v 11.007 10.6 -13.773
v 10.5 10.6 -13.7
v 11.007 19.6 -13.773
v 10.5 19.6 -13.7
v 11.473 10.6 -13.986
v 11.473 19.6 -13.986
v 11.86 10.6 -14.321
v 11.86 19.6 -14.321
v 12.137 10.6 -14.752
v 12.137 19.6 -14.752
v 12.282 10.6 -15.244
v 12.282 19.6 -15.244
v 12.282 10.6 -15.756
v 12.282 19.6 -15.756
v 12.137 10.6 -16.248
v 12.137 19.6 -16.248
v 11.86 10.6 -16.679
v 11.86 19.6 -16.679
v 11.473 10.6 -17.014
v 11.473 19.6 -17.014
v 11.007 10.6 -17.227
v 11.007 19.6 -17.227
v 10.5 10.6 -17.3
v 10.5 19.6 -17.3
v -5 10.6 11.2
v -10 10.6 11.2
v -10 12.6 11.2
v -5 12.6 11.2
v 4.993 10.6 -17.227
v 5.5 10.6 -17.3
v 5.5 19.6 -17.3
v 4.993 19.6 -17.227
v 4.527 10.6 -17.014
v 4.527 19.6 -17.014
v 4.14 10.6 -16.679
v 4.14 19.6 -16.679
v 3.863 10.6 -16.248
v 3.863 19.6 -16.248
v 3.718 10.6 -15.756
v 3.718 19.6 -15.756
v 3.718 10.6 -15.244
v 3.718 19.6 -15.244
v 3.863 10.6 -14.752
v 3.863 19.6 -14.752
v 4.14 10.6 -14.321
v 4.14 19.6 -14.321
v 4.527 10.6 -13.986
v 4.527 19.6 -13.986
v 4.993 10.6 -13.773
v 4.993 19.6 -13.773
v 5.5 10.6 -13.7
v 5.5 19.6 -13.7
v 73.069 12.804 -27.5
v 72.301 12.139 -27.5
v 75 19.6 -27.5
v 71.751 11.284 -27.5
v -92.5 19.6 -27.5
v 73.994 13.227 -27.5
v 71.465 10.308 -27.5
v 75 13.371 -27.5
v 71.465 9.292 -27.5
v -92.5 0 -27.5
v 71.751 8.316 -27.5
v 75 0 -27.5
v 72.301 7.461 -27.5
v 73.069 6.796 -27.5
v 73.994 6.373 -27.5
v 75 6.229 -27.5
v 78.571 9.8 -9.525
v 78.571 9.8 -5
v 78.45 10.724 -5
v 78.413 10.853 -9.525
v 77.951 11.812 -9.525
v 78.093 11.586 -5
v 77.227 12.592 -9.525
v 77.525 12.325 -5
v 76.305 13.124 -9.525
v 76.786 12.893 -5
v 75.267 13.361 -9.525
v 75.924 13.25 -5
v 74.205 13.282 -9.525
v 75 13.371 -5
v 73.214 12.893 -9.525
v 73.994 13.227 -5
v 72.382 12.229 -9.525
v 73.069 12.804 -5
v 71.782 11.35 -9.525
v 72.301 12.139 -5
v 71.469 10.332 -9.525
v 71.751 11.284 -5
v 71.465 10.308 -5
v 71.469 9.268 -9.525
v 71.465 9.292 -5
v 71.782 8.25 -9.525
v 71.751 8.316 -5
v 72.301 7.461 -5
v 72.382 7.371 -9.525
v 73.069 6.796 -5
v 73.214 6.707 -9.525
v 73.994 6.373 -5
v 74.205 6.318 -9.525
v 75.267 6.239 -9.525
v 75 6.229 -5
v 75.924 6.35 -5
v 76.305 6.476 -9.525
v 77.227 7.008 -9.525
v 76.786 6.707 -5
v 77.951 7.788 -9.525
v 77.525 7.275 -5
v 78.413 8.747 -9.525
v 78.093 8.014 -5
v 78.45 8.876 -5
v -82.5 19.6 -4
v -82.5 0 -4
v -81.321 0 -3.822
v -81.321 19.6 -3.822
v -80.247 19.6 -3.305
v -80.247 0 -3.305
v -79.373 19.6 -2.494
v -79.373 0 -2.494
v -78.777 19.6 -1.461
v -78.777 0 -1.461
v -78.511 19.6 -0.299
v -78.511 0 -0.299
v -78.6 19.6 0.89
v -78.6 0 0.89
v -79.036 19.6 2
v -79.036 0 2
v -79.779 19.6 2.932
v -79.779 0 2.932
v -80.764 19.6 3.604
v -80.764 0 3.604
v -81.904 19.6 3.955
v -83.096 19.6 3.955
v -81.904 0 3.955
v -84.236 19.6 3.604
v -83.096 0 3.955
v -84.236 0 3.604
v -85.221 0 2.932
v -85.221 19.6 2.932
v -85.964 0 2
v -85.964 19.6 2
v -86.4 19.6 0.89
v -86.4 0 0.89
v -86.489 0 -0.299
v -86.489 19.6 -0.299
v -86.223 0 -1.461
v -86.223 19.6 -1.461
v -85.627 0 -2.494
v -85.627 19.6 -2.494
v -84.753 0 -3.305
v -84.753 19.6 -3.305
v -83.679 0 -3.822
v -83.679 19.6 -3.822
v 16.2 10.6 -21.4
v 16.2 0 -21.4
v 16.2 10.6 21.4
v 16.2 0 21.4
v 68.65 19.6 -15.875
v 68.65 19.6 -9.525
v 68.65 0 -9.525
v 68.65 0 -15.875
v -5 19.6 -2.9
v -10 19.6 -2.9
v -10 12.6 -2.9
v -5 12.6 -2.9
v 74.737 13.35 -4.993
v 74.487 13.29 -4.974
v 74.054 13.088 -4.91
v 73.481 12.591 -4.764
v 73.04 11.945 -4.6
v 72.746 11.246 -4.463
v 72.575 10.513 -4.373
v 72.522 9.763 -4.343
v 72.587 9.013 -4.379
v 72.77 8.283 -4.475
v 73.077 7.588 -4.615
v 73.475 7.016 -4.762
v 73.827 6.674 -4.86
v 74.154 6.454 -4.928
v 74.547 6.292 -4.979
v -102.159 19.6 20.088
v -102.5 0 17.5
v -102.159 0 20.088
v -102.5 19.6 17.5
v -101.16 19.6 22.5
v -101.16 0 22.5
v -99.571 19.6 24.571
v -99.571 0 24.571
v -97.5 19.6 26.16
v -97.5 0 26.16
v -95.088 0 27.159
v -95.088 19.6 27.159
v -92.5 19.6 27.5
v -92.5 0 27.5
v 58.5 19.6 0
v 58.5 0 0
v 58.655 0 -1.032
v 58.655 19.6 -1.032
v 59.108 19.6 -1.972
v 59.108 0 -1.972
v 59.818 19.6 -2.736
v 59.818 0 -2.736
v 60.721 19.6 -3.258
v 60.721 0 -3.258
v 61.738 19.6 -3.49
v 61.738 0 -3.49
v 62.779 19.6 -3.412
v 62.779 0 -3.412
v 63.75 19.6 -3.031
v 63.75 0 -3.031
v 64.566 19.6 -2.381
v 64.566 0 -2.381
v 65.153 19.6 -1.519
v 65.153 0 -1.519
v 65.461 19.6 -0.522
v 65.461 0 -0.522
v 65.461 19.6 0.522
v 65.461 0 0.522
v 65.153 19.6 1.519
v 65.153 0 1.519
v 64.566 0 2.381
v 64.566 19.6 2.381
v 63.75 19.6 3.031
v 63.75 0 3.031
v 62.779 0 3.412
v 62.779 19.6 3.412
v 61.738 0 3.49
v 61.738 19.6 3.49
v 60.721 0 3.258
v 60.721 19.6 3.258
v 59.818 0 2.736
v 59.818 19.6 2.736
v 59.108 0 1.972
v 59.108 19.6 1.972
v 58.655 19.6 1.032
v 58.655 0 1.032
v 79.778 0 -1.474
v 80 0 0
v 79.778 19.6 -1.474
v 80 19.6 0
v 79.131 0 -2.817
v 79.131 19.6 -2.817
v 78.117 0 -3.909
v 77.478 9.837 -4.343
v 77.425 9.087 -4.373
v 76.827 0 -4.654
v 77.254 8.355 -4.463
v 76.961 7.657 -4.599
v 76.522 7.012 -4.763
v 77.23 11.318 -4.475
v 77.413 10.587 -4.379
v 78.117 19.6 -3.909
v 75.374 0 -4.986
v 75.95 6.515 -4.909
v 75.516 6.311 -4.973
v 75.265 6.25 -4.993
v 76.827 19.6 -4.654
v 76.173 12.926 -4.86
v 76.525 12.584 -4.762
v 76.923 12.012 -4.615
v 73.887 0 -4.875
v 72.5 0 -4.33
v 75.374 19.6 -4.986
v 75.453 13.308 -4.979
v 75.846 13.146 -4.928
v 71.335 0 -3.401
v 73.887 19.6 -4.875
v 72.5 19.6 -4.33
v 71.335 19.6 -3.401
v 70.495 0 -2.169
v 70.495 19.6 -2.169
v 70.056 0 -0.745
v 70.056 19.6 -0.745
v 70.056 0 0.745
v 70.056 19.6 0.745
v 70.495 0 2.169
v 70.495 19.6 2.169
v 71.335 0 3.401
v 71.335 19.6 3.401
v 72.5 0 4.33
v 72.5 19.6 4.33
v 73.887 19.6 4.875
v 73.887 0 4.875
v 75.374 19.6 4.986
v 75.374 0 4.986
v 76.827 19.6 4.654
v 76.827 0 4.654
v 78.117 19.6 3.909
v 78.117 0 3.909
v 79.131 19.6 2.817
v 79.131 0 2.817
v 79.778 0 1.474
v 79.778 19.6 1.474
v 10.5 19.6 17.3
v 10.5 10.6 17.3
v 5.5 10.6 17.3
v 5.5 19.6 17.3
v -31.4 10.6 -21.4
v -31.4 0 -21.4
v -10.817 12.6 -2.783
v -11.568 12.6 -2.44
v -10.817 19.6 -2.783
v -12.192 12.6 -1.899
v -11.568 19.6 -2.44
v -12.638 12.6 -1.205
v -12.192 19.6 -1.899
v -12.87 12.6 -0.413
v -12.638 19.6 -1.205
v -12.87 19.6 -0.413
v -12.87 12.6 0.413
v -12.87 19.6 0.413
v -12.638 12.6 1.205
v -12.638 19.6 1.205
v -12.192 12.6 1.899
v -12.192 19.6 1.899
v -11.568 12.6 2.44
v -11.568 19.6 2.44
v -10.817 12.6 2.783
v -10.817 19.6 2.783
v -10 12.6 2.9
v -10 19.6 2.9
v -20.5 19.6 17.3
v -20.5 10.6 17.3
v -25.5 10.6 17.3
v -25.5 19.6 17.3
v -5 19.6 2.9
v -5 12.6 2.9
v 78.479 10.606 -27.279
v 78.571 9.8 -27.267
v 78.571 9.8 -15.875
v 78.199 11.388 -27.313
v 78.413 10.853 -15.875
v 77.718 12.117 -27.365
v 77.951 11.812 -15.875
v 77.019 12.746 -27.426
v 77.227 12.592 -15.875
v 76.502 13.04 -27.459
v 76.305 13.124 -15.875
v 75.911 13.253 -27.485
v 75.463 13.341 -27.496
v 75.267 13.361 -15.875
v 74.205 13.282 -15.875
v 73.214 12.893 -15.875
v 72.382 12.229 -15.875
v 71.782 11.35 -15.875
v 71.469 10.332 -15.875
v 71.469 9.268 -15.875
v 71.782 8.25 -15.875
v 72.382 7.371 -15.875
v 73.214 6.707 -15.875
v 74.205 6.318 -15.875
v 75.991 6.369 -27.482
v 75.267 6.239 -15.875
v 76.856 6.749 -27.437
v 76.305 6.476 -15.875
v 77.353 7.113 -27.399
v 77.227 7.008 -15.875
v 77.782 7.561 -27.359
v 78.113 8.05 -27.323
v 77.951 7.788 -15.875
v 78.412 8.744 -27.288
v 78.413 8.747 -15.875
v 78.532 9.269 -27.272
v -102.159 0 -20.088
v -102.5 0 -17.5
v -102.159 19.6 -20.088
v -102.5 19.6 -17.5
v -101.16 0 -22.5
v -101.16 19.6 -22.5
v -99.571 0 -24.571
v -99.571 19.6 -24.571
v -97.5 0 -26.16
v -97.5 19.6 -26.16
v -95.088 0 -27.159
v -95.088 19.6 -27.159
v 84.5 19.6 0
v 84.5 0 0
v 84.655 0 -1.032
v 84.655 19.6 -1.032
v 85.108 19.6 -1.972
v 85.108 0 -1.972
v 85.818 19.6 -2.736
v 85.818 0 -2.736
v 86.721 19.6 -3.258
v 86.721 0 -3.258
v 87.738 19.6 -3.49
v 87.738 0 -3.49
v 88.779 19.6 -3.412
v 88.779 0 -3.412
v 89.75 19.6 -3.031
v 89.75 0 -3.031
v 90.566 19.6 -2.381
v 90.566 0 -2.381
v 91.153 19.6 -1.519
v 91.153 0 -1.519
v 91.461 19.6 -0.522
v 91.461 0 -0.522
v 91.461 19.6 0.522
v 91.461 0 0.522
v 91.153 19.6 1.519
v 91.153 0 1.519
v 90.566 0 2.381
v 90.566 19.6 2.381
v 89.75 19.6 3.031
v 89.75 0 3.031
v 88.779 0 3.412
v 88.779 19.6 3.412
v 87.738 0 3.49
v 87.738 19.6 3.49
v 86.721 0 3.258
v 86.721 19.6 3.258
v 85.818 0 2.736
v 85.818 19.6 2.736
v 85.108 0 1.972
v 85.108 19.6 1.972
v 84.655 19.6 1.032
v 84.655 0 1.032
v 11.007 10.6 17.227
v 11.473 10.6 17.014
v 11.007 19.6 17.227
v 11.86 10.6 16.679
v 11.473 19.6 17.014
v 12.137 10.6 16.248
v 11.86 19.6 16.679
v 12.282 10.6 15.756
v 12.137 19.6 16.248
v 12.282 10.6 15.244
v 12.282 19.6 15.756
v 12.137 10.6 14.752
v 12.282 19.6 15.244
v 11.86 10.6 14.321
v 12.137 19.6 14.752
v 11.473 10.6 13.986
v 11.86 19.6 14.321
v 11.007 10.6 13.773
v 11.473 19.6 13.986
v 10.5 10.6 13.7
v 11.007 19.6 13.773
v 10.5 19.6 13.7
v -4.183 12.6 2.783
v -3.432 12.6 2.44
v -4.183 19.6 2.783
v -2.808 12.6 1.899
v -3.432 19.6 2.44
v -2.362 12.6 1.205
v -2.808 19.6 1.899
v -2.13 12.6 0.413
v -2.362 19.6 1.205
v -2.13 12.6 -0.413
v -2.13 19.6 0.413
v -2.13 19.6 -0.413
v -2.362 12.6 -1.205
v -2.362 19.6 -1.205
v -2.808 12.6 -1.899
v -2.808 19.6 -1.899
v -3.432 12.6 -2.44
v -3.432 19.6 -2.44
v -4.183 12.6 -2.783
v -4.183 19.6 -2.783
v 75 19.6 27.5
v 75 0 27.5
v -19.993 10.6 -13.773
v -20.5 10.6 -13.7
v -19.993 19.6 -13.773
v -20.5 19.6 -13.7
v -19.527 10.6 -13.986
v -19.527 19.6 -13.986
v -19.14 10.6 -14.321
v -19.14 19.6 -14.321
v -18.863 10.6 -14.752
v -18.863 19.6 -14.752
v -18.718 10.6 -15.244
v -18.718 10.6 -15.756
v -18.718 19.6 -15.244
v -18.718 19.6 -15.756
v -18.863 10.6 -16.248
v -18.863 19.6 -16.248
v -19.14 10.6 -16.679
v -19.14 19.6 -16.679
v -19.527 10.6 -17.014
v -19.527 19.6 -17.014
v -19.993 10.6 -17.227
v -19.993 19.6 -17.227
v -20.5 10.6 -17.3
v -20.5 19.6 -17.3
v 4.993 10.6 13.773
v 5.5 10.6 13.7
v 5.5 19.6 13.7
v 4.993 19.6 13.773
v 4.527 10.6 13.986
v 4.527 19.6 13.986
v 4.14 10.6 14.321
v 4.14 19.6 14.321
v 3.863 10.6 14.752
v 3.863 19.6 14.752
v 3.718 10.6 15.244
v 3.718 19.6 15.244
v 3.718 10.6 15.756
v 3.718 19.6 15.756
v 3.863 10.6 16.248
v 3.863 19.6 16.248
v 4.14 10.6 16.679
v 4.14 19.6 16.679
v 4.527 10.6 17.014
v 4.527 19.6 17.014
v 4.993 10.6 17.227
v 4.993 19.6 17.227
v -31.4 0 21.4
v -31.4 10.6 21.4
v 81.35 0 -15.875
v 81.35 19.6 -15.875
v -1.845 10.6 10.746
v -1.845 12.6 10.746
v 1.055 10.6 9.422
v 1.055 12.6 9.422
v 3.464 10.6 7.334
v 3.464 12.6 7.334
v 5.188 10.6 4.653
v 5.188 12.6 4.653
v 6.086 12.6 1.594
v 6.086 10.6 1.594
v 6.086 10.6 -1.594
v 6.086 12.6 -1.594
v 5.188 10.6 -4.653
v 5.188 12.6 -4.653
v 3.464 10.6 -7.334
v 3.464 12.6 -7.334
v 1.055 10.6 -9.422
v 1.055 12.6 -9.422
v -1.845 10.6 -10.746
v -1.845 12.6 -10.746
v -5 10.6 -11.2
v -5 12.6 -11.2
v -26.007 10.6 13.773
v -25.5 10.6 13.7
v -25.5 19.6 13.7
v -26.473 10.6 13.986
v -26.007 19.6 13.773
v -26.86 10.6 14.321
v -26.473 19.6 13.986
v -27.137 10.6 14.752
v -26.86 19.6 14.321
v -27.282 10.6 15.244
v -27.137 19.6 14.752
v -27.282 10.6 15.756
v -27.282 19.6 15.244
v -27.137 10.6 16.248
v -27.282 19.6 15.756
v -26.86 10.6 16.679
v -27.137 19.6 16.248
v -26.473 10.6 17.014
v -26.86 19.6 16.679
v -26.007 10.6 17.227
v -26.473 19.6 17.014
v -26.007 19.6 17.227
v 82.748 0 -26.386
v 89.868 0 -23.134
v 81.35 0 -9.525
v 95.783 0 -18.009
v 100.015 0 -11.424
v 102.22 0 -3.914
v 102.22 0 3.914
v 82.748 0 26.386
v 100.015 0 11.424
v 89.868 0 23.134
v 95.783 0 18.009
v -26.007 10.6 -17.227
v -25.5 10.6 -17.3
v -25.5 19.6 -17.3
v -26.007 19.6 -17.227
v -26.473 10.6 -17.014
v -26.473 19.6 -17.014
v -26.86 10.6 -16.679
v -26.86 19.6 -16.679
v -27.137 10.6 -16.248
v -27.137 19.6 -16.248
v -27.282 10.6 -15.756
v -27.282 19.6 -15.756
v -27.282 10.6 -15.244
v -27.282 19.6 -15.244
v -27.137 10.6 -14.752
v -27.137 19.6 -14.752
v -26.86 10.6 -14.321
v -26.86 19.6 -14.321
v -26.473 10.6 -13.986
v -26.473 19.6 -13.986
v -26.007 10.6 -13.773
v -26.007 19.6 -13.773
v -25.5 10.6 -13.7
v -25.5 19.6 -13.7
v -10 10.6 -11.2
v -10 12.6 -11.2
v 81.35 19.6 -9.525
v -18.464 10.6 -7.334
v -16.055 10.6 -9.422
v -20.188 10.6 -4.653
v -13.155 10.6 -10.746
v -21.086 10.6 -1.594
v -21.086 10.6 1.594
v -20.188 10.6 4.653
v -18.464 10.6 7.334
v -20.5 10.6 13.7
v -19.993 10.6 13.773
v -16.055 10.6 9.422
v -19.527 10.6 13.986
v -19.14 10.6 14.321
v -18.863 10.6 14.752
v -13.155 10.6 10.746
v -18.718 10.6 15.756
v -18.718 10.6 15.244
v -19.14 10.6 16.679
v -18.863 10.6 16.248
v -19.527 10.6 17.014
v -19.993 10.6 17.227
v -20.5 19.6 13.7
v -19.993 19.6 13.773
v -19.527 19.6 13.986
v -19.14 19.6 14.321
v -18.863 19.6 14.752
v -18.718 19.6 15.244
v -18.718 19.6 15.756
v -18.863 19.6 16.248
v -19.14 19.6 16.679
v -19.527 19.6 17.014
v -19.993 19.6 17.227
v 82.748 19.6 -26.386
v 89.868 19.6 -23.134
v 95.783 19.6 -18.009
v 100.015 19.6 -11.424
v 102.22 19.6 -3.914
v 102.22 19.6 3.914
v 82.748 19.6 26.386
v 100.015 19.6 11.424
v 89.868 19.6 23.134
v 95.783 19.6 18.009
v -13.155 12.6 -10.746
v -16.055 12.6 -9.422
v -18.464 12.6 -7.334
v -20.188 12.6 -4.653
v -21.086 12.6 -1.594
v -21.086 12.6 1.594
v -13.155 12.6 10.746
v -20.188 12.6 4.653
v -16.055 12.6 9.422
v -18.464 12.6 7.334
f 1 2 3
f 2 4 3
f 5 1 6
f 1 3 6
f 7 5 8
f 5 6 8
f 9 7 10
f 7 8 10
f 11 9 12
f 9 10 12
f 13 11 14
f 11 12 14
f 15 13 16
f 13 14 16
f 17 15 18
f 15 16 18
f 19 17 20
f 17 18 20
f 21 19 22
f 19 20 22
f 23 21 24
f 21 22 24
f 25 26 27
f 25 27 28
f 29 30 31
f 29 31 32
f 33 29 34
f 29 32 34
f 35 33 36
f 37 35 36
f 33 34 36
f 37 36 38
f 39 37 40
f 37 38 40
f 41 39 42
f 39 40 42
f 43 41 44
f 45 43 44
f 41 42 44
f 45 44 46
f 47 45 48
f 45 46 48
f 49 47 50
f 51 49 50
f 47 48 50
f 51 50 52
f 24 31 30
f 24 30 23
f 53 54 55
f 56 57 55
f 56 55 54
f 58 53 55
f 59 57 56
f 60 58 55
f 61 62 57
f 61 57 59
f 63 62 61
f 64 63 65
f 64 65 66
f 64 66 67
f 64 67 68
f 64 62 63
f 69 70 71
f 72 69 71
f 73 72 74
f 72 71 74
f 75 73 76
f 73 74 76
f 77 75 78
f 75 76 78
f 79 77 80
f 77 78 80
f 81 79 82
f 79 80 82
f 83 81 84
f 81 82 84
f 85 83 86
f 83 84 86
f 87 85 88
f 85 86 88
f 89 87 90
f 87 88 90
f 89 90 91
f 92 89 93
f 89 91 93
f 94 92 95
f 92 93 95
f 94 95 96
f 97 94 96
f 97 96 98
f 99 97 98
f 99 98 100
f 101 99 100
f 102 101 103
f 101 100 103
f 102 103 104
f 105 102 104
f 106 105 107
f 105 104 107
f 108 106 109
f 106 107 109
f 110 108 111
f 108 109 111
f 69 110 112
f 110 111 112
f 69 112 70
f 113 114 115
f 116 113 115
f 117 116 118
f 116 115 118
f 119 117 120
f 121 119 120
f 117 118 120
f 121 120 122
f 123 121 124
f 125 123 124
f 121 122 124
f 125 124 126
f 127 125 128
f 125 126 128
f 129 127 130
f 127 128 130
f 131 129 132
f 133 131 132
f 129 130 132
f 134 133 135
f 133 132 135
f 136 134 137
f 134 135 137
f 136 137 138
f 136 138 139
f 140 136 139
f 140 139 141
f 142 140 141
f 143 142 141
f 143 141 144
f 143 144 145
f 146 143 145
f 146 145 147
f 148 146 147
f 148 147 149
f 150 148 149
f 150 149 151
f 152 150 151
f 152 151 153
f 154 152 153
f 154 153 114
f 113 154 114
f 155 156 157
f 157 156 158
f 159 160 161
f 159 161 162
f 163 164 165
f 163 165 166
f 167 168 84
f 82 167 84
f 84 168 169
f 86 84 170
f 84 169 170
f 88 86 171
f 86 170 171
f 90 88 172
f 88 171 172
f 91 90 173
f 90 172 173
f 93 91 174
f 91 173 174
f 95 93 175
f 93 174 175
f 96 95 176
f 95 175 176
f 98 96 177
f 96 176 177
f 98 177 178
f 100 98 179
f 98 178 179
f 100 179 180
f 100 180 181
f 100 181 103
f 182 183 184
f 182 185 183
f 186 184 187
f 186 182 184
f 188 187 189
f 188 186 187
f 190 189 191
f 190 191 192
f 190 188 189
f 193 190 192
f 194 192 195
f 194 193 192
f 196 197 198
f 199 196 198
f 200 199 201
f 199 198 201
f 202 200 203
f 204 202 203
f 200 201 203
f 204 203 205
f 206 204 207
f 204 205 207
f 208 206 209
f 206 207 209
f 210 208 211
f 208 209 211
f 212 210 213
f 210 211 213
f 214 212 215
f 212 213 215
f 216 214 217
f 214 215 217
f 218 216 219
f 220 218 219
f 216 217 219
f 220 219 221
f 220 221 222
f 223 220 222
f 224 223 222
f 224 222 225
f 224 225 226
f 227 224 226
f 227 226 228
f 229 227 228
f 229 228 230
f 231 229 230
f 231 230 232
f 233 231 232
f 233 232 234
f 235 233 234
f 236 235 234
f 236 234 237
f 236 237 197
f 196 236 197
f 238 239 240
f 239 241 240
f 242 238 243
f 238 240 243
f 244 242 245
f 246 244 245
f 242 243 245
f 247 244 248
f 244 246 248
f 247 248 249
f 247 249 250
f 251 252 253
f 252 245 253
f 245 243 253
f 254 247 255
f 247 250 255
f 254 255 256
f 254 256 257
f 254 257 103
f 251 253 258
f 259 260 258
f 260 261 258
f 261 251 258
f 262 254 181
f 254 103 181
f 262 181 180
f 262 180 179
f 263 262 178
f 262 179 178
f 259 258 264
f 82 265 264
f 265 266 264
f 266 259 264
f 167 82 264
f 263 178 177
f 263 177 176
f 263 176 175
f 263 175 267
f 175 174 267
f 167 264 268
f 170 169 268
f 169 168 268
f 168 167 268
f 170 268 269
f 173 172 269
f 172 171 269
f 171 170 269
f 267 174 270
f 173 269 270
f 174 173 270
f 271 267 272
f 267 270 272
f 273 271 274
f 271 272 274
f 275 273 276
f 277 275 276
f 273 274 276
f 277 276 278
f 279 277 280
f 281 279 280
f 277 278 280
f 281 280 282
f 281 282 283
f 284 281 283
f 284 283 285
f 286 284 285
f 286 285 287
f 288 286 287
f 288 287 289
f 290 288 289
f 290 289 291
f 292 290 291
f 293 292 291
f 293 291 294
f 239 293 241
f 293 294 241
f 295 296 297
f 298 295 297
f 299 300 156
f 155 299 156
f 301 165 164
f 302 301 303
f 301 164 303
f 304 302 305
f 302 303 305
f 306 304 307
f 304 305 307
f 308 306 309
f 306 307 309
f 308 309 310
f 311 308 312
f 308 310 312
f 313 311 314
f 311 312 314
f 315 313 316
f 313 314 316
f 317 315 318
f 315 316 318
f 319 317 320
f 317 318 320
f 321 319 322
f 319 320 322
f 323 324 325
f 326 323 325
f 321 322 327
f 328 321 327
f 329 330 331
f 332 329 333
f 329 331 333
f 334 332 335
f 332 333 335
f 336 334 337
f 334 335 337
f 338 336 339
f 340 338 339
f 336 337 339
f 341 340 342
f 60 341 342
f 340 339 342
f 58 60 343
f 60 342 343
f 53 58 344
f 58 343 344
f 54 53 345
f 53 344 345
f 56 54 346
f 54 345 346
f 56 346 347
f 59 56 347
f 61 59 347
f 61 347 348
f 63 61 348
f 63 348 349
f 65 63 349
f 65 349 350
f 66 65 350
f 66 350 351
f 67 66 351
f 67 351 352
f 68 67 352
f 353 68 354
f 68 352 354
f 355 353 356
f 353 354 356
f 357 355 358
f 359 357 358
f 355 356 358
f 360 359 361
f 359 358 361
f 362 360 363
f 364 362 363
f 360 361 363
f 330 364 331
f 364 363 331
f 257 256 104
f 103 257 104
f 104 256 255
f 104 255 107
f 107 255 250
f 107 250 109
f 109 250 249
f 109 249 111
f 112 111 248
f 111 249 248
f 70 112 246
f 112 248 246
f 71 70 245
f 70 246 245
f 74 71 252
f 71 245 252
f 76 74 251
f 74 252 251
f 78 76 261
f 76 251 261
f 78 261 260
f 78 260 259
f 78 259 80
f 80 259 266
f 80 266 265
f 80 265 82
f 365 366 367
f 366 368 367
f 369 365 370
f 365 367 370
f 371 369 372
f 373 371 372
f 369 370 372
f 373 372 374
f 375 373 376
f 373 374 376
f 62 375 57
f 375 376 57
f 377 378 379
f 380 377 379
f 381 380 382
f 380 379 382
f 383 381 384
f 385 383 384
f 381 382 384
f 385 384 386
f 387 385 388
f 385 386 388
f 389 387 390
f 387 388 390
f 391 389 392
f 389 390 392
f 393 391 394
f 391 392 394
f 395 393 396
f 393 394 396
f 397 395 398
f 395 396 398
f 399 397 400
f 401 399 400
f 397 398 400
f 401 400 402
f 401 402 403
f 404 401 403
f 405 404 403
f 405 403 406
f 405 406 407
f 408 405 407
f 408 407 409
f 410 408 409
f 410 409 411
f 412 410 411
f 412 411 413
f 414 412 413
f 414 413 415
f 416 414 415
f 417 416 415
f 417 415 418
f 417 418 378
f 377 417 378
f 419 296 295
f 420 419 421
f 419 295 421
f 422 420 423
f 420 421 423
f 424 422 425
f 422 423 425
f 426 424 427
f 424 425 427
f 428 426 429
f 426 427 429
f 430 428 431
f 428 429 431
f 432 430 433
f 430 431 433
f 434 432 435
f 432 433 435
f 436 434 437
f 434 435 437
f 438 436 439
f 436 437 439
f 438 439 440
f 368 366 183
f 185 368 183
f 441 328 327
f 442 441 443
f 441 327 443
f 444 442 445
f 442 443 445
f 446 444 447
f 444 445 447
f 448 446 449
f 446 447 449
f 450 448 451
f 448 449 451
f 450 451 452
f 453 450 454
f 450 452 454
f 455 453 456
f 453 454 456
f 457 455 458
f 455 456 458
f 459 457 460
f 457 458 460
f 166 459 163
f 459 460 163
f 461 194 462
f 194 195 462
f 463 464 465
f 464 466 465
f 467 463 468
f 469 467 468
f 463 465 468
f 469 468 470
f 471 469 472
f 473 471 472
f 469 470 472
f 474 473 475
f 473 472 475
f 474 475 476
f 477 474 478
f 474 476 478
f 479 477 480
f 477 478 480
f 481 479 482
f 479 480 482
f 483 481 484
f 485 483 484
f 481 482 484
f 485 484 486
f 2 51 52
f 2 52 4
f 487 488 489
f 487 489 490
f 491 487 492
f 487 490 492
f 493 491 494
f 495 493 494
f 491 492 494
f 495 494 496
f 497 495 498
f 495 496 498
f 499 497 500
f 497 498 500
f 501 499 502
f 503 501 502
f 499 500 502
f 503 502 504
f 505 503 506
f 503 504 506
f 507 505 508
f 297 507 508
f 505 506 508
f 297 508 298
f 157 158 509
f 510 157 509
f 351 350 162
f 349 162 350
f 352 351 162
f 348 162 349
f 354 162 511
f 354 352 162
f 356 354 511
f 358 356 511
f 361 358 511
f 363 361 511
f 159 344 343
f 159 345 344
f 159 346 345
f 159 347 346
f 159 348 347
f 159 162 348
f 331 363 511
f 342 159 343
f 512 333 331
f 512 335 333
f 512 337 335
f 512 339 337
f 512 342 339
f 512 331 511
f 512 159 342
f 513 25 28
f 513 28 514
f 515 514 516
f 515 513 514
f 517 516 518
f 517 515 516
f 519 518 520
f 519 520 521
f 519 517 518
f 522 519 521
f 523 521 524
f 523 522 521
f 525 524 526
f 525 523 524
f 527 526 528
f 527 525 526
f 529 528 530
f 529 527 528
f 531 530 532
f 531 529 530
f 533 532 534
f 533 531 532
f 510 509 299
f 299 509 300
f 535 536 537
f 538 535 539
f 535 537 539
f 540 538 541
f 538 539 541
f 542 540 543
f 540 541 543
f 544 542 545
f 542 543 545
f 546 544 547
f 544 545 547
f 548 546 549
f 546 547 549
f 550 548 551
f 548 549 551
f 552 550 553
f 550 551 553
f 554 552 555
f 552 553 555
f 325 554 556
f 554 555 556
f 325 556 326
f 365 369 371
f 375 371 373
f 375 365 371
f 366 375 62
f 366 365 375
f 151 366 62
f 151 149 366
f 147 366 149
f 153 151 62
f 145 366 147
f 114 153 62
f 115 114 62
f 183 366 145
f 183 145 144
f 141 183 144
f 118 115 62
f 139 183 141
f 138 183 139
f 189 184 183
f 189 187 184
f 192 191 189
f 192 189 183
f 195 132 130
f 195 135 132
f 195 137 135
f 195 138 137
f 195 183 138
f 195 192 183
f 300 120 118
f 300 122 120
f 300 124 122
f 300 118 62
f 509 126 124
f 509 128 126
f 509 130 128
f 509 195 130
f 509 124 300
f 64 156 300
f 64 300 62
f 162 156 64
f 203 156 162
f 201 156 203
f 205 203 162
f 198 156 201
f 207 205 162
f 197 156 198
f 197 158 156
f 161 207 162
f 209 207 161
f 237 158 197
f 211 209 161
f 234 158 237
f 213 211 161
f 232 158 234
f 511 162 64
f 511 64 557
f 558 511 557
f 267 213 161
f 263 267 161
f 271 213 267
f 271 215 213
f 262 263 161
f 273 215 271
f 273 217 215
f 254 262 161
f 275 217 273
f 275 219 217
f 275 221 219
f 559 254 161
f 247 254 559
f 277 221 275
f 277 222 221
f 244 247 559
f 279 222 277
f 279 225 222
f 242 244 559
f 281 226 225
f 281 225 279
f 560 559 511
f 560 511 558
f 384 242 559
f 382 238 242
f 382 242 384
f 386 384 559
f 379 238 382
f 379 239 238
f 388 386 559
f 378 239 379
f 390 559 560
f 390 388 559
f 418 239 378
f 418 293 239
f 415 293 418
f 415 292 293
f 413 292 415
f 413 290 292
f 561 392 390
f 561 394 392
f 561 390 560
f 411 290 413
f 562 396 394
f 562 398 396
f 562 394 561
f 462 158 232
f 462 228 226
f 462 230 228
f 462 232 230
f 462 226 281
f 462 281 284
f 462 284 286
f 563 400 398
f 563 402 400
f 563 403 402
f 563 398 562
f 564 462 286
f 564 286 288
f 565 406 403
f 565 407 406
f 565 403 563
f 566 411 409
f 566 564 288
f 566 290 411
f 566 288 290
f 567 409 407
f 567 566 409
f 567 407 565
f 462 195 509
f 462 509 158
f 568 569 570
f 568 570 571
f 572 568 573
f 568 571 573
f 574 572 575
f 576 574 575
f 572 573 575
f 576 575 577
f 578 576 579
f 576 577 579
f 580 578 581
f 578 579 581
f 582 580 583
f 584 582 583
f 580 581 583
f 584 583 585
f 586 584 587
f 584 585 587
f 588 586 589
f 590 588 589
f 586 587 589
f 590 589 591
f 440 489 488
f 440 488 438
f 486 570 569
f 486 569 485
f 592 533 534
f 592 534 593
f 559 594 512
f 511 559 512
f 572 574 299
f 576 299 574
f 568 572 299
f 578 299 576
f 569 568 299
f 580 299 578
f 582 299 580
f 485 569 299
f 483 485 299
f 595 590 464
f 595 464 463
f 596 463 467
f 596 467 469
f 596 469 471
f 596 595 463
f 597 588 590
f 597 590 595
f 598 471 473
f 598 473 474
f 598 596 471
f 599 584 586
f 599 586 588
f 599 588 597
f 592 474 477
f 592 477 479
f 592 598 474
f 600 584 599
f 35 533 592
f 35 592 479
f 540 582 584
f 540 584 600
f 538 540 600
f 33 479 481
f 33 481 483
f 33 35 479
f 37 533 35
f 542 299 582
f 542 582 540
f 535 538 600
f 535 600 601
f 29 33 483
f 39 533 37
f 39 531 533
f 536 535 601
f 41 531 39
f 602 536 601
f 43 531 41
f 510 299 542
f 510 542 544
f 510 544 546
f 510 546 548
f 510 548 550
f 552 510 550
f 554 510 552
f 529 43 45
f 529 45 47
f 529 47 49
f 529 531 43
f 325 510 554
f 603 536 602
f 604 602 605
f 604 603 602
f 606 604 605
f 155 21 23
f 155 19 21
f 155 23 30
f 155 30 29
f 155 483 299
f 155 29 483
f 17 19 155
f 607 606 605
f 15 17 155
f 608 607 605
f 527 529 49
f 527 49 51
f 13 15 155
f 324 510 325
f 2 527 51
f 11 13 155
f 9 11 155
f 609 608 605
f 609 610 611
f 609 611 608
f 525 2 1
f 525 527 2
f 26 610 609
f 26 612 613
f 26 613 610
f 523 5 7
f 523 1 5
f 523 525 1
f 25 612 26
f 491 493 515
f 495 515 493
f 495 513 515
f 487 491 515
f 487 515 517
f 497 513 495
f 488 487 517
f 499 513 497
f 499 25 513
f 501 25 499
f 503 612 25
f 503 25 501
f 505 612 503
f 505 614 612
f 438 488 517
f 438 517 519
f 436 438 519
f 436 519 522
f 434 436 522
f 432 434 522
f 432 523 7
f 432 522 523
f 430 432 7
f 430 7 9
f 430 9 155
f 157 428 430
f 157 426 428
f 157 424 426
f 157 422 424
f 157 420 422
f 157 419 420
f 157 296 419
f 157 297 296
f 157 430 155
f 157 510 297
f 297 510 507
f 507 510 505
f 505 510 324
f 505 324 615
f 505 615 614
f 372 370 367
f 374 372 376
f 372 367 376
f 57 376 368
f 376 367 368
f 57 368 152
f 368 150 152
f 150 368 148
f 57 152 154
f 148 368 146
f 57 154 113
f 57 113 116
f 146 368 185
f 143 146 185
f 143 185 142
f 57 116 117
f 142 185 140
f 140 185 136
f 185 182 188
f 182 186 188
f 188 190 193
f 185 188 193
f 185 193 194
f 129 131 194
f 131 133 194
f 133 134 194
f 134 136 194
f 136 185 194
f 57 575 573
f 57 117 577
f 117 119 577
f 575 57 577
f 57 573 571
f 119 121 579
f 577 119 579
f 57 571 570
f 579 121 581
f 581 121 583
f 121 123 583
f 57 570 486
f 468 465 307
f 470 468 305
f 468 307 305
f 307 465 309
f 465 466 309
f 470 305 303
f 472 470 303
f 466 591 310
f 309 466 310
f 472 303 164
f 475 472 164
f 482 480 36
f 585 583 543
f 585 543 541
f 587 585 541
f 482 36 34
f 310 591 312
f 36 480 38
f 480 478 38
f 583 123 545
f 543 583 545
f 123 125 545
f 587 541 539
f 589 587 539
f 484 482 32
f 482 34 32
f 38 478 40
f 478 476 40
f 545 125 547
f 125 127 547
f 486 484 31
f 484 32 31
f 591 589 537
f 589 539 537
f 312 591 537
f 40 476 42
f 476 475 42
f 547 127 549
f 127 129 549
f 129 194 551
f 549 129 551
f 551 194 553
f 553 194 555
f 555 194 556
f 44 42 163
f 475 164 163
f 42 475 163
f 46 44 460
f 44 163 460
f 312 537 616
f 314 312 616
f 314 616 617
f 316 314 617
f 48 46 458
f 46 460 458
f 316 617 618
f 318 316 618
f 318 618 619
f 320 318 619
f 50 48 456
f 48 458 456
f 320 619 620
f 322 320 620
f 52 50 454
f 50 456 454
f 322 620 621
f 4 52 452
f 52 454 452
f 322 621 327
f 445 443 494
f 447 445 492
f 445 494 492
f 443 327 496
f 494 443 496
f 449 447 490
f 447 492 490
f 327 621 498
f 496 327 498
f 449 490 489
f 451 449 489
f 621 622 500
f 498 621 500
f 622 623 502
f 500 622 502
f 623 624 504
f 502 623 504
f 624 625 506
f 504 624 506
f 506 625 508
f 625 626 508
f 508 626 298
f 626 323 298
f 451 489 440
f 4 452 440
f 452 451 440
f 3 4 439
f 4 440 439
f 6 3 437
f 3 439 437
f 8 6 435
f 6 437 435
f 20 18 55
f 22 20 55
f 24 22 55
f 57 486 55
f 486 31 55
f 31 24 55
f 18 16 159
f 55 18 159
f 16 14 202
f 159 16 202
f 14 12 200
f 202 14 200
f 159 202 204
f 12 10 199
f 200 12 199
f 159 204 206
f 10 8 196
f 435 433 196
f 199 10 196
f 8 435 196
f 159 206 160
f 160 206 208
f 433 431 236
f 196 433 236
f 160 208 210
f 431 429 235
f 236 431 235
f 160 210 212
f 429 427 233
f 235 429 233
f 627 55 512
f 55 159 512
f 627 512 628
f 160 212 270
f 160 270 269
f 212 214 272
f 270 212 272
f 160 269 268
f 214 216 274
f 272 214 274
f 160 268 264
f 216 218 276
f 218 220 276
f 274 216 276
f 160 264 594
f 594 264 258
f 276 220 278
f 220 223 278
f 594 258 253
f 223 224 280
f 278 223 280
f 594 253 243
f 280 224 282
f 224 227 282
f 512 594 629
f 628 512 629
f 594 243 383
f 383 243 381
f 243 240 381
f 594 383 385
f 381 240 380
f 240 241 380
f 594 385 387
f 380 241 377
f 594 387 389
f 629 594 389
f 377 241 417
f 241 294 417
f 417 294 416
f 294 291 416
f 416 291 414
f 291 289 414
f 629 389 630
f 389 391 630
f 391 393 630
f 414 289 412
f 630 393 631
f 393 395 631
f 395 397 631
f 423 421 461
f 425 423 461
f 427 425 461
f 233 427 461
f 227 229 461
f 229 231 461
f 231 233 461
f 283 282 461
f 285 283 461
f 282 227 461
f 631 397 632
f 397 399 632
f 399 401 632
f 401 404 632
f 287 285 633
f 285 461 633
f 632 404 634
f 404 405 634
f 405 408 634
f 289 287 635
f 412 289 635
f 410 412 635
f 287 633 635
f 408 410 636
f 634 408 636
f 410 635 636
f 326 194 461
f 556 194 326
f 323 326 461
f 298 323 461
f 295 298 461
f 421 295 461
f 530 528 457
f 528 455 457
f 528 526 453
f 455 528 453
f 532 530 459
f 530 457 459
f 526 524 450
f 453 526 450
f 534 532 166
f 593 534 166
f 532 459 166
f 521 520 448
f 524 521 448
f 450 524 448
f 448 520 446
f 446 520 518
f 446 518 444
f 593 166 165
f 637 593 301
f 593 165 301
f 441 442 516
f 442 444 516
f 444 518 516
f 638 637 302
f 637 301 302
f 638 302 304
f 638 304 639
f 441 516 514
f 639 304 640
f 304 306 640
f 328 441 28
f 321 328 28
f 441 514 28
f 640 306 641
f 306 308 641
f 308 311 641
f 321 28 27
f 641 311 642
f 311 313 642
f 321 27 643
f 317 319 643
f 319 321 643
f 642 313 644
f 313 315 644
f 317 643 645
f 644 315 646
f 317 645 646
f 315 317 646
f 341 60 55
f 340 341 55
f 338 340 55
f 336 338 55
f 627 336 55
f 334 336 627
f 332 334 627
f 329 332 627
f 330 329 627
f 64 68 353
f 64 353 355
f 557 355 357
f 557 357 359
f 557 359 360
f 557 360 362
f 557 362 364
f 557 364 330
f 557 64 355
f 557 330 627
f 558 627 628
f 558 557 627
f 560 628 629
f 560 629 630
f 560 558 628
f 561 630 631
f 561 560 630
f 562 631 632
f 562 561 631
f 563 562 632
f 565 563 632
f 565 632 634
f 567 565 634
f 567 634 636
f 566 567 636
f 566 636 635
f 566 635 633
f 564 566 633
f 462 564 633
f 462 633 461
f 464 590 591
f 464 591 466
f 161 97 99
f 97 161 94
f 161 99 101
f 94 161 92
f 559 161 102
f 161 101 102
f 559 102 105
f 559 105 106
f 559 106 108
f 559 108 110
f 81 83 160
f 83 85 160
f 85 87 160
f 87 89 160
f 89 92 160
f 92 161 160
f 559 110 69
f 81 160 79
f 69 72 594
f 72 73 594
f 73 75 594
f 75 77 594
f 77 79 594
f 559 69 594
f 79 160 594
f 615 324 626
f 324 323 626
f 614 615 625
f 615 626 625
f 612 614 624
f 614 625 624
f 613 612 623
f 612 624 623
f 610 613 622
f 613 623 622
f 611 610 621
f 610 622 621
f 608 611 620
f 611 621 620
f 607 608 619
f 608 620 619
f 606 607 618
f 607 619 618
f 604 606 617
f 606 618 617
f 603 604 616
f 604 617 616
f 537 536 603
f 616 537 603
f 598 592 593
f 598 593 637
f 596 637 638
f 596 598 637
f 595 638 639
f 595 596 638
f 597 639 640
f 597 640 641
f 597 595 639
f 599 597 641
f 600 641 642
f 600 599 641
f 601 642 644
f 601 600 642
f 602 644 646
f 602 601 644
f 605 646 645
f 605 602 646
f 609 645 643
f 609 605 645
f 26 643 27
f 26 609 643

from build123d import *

# Parameters (mm, degrees)
SKETCH1_W                       = 150
SKETCH1_H                       = 55
BOSS_EXTRUDE1_DEPTH             = 19.6
SKETCH2_W                       = 27.5
SKETCH2_H                       = 55
BOSS_EXTRUDE2_DEPTH             = 19.6
M8_CLEARANCE_HOLE1_D            = 10
M6_CLEARANCE_HOLE1_D            = 7
FILLET1_R                       = 10
SKETCH11_W                      = 42.4
SKETCH11_H                      = 42.4
CUT_EXTRUDE1_DEPTH              = 10.6
SKETCH13_W                      = 1.8
SKETCH13_H                      = 9
M3_CLEARANCE_HOLE1_AT_2_COUNT   = 2
M3_CLEARANCE_HOLE1_AT_2_PITCH   = 31
M3_CLEARANCE_HOLE1_AT_3_COUNT   = 2
M3_CLEARANCE_HOLE1_AT_3_PITCH   = 43.840620434
M3_CLEARANCE_HOLE1_AT_4_COUNT   = 2
M3_CLEARANCE_HOLE1_AT_4_PITCH   = 31
M3_CLEARANCE_HOLE1_AT_5_COUNT   = 2
M3_CLEARANCE_HOLE1_AT_5_PITCH   = 21.920310217
M3_CLEARANCE_HOLE1_AT_6_COUNT   = 2
M3_CLEARANCE_HOLE1_AT_6_PITCH   = 5
M3_CLEARANCE_HOLE1_AT_7_COUNT   = 2
M3_CLEARANCE_HOLE1_AT_7_PITCH   = 31.400636936
M3_CLEARANCE_HOLE1_AT_8_COUNT   = 2
M3_CLEARANCE_HOLE1_AT_8_PITCH   = 40.459856648
M3_CLEARANCE_HOLE1_AT_9_COUNT   = 2
M3_CLEARANCE_HOLE1_AT_9_PITCH   = 26
M5_CLEARANCE_HOLE1_D            = 5.8
SKETCH17_R                      = 4
CUT_EXTRUDE2_DEPTH              = 108.919692364
SKETCH18_W                      = 0.2
SKETCH18_H                      = 42.4
SKETCH18_W_2                    = 5
SKETCH18_H_2                    = 0.2
CUT_EXTRUDE3_DEPTH              = 10.6
SKETCH19_W                      = 5
SKETCH19_H                      = 5.8
SKETCH19_H_2                    = 3.6
CUT_EXTRUDE4_DEPTH              = 107.652988706
CUT_EXTRUDE5_DEPTH              = 2
SKETCH21_W                      = 12.7
SKETCH21_H                      = 6.35
CUT_EXTRUDE6_DEPTH              = 108.919692364
F_1_4_CLEARANCE_HOLE1_OUTLINE_W = 3.57124
F_1_4_CLEARANCE_HOLE1_OUTLINE_H = 11.625002241


# Read off the part's stored shape, not the designer's step: 1/4 Clearance Hole1
with BuildPart() as part:
    # Sketch1 → Boss-Extrude1 (new body)
    with BuildSketch(Plane(origin=(0, 0, 0), x_dir=(1, 0, 0), z_dir=(0, 1, 0))):
        Rectangle(SKETCH1_W, SKETCH1_H)
    extrude(amount=BOSS_EXTRUDE1_DEPTH)

    # Sketch2 → Boss-Extrude2 (add)
    with BuildSketch(Plane.XZ):
        with Locations((-88.75, 0)):
            Rectangle(SKETCH2_W, SKETCH2_H)
        with BuildLine():
            Line((75, 27.5), (75, -27.5))
            ThreePointArc((75, -27.5), (102.5, 0), (75, 27.5))
        make_face()
    extrude(amount=-BOSS_EXTRUDE2_DEPTH)

    # M8 Clearance Hole1 (through all)
    with Locations(Plane(origin=(0, 0, 0), x_dir=(-1, 0, 0), z_dir=(0, -1, 0))):
        with Locations((-75, 0)):
            Hole(M8_CLEARANCE_HOLE1_D / 2)

    # M6 Clearance Hole1 (through all)
    with Locations(Plane(origin=(0, 19.6, 0), x_dir=(1, 0, 0), z_dir=(0, 1, 0))):
        with Locations((62, 0), (88, 0)):
            Hole(M6_CLEARANCE_HOLE1_D / 2)

    # Fillet1
    fillet1_edges = [part.edges().sort_by_distance(p)[0] for p in [
        (-102.5, 9.8, -27.5),
        (-102.5, 9.8, 27.5),
    ]]
    fillet(fillet1_edges, radius=FILLET1_R)

    # Sketch11 → Cut-Extrude1 (cut)
    with BuildSketch(Plane.XZ):
        with Locations((-10, 0)):
            Rectangle(SKETCH11_W, SKETCH11_H)
    extrude(amount=-CUT_EXTRUDE1_DEPTH, mode=Mode.SUBTRACT)

    # Sketch13 → M3 Clearance Hole1 (revolve, cut)
    with BuildSketch(Plane(origin=(5.5, 10.6, -15.5), x_dir=(0, 0, -1), z_dir=(1, 0, 0))):
        with Locations((0.9, 4.5)):
            Rectangle(SKETCH13_W, SKETCH13_H)
    m3_clearance_hole1 = revolve(axis=Axis((5.5, 4.25, -15.5), (0, 1, 0)), mode=Mode.SUBTRACT)

    # M3 Clearance Hole1 at 2: M3 Clearance Hole1 ×2
    with Locations(*[(-i * M3_CLEARANCE_HOLE1_AT_2_PITCH, 0, 0) for i in range(1, M3_CLEARANCE_HOLE1_AT_2_COUNT)]):
        add(m3_clearance_hole1, mode=Mode.SUBTRACT)

    # M3 Clearance Hole1 at 3: M3 Clearance Hole1 ×2
    with Locations(*[Vector(-0.7071067811865476, 0, 0.7071067811865476) * (i * M3_CLEARANCE_HOLE1_AT_3_PITCH) for i in range(1, M3_CLEARANCE_HOLE1_AT_3_COUNT)]):
        add(m3_clearance_hole1, mode=Mode.SUBTRACT)

    # M3 Clearance Hole1 at 4: M3 Clearance Hole1 ×2
    with Locations(*[(0, 0, i * M3_CLEARANCE_HOLE1_AT_4_PITCH) for i in range(1, M3_CLEARANCE_HOLE1_AT_4_COUNT)]):
        add(m3_clearance_hole1, mode=Mode.SUBTRACT)

    # M3 Clearance Hole1 at 5: M3 Clearance Hole1 ×2
    with Locations(*[Vector(-0.7071067811865476, 0, 0.7071067811865476) * (i * M3_CLEARANCE_HOLE1_AT_5_PITCH) for i in range(1, M3_CLEARANCE_HOLE1_AT_5_COUNT)]):
        add(m3_clearance_hole1, mode=Mode.SUBTRACT)

    # M3 Clearance Hole1 at 6: M3 Clearance Hole1 ×2
    with Locations(*[(i * M3_CLEARANCE_HOLE1_AT_6_PITCH, 0, 0) for i in range(1, M3_CLEARANCE_HOLE1_AT_6_COUNT)]):
        add(m3_clearance_hole1, mode=Mode.SUBTRACT)

    # M3 Clearance Hole1 at 7: M3 Clearance Hole1 ×2
    with Locations(*[Vector(0.15923243882462054, 0, 0.9872411207126471) * (i * M3_CLEARANCE_HOLE1_AT_7_PITCH) for i in range(1, M3_CLEARANCE_HOLE1_AT_7_COUNT)]):
        add(m3_clearance_hole1, mode=Mode.SUBTRACT)

    # M3 Clearance Hole1 at 8: M3 Clearance Hole1 ×2
    with Locations(*[Vector(-0.6426122619764711, 0, 0.7661915431257925) * (i * M3_CLEARANCE_HOLE1_AT_8_PITCH) for i in range(1, M3_CLEARANCE_HOLE1_AT_8_COUNT)]):
        add(m3_clearance_hole1, mode=Mode.SUBTRACT)

    # M3 Clearance Hole1 at 9: M3 Clearance Hole1 ×2
    with Locations(*[(-i * M3_CLEARANCE_HOLE1_AT_9_PITCH, 0, 0) for i in range(1, M3_CLEARANCE_HOLE1_AT_9_COUNT)]):
        add(m3_clearance_hole1, mode=Mode.SUBTRACT)

    # M5 Clearance Hole1 (through all)
    with Locations(Plane(origin=(0, 10.6, 0), x_dir=(-1, 0, 0), z_dir=(0, -1, 0))):
        with Locations((10, 0), (5, 0)):
            Hole(M5_CLEARANCE_HOLE1_D / 2)

    # Sketch17 → Cut-Extrude2 (cut, through all)
    with BuildSketch(Plane.XZ):
        with Locations(Location((-82.5, 0, 0), (0, 0, 270))):
            Circle(SKETCH17_R)
    extrude(amount=-CUT_EXTRUDE2_DEPTH, mode=Mode.SUBTRACT)

    # Sketch18 → Cut-Extrude3 (cut)
    with BuildSketch(Plane.XZ):
        with Locations((-31.3, 0)):
            Rectangle(SKETCH18_W, SKETCH18_H)
        Polygon((11.2, -21.2), (-31.2, -21.2), (-31.4, -21.2), (-31.4, -21.4), (11.2, -21.4), align=None)
        with Locations((13.7, -21.3)):
            Rectangle(SKETCH18_W_2, SKETCH18_H_2)
        Polygon((11.2, 21.4), (11.2, 21.2), (11.2, -21.2), (16.2, -21.2), (16.2, 21.4), align=None)
        Polygon((-31.4, 21.2), (-31.2, 21.2), (11.2, 21.2), (11.2, 21.4), (-31.4, 21.4), align=None)
    extrude(amount=-CUT_EXTRUDE3_DEPTH, mode=Mode.SUBTRACT)

    # Sketch19 → Cut-Extrude4 (cut, through all)
    with BuildSketch(Plane.XZ.offset(-10.6)):
        with BuildLine():
            ThreePointArc((-20.5, 13.7), (-22.3, 15.5), (-20.5, 17.3))
            Line((-20.5, 17.3), (-25.5, 17.3))
            ThreePointArc((-25.5, 17.3), (-24.227207794, 16.772792206), (-23.7, 15.5))
            ThreePointArc((-23.7, 15.5), (-24.227207794, 14.227207794), (-25.5, 13.7))
            Line((-25.5, 13.7), (-20.5, 13.7))
        make_face()
        with BuildLine():
            ThreePointArc((10.5, 13.7), (8.7, 15.5), (10.5, 17.3))
            Line((10.5, 17.3), (5.5, 17.3))
            ThreePointArc((5.5, 17.3), (6.772792206, 16.772792206), (7.3, 15.5))
            ThreePointArc((7.3, 15.5), (6.772792206, 14.227207794), (5.5, 13.7))
            Line((5.5, 13.7), (10.5, 13.7))
        make_face()
        with Locations((-7.5, 0)):
            Rectangle(SKETCH19_W, SKETCH19_H)
        with Locations((8, -15.5)):
            Rectangle(SKETCH19_W, SKETCH19_H_2)
        with Locations((-23, -15.5)):
            Rectangle(SKETCH19_W, SKETCH19_H_2)
    extrude(amount=-CUT_EXTRUDE4_DEPTH, mode=Mode.SUBTRACT)

    # Sketch16 → Cut-Extrude5 (cut)
    with BuildSketch(Plane.XZ.offset(-10.6)):
        with BuildLine():
            Line((-10, 11.2), (-5, 11.2))
            ThreePointArc((-5, 11.2), (6.2, 0), (-5, -11.2))
            Line((-5, -11.2), (-10, -11.2))
            ThreePointArc((-10, -11.2), (-21.2, 0), (-10, 11.2))
        make_face()
    extrude(amount=-CUT_EXTRUDE5_DEPTH, mode=Mode.SUBTRACT)

    # Sketch21 → Cut-Extrude6 (cut, through all)
    with BuildSketch(Plane(origin=(0, 19.6, 0), x_dir=(1, 0, 0), z_dir=(0, 1, 0))):
        with Locations((75, 12.7)):
            Rectangle(SKETCH21_W, SKETCH21_H)
    extrude(amount=-CUT_EXTRUDE6_DEPTH, mode=Mode.SUBTRACT)

    # 1/4 Clearance Hole1 outline → 1/4 Clearance Hole1 (revolve, cut)
    with BuildSketch(Plane(origin=(75, 9.8, 0), x_dir=(1, 0, 0), z_dir=(0, -1, 0))):
        Polygon((2.477440343, -4.342778861), (0, -4.342778861), (0, -9.525), (3.57124, -9.525), (3.571240952, -5.000000572), align=None)
        with Locations((1.78562, -21.687501121)):
            Rectangle(F_1_4_CLEARANCE_HOLE1_OUTLINE_W, F_1_4_CLEARANCE_HOLE1_OUTLINE_H)
    revolve(axis=Axis((75, 9.8, 0), (0, 0, 1)), mode=Mode.SUBTRACT)


solid = part.part
